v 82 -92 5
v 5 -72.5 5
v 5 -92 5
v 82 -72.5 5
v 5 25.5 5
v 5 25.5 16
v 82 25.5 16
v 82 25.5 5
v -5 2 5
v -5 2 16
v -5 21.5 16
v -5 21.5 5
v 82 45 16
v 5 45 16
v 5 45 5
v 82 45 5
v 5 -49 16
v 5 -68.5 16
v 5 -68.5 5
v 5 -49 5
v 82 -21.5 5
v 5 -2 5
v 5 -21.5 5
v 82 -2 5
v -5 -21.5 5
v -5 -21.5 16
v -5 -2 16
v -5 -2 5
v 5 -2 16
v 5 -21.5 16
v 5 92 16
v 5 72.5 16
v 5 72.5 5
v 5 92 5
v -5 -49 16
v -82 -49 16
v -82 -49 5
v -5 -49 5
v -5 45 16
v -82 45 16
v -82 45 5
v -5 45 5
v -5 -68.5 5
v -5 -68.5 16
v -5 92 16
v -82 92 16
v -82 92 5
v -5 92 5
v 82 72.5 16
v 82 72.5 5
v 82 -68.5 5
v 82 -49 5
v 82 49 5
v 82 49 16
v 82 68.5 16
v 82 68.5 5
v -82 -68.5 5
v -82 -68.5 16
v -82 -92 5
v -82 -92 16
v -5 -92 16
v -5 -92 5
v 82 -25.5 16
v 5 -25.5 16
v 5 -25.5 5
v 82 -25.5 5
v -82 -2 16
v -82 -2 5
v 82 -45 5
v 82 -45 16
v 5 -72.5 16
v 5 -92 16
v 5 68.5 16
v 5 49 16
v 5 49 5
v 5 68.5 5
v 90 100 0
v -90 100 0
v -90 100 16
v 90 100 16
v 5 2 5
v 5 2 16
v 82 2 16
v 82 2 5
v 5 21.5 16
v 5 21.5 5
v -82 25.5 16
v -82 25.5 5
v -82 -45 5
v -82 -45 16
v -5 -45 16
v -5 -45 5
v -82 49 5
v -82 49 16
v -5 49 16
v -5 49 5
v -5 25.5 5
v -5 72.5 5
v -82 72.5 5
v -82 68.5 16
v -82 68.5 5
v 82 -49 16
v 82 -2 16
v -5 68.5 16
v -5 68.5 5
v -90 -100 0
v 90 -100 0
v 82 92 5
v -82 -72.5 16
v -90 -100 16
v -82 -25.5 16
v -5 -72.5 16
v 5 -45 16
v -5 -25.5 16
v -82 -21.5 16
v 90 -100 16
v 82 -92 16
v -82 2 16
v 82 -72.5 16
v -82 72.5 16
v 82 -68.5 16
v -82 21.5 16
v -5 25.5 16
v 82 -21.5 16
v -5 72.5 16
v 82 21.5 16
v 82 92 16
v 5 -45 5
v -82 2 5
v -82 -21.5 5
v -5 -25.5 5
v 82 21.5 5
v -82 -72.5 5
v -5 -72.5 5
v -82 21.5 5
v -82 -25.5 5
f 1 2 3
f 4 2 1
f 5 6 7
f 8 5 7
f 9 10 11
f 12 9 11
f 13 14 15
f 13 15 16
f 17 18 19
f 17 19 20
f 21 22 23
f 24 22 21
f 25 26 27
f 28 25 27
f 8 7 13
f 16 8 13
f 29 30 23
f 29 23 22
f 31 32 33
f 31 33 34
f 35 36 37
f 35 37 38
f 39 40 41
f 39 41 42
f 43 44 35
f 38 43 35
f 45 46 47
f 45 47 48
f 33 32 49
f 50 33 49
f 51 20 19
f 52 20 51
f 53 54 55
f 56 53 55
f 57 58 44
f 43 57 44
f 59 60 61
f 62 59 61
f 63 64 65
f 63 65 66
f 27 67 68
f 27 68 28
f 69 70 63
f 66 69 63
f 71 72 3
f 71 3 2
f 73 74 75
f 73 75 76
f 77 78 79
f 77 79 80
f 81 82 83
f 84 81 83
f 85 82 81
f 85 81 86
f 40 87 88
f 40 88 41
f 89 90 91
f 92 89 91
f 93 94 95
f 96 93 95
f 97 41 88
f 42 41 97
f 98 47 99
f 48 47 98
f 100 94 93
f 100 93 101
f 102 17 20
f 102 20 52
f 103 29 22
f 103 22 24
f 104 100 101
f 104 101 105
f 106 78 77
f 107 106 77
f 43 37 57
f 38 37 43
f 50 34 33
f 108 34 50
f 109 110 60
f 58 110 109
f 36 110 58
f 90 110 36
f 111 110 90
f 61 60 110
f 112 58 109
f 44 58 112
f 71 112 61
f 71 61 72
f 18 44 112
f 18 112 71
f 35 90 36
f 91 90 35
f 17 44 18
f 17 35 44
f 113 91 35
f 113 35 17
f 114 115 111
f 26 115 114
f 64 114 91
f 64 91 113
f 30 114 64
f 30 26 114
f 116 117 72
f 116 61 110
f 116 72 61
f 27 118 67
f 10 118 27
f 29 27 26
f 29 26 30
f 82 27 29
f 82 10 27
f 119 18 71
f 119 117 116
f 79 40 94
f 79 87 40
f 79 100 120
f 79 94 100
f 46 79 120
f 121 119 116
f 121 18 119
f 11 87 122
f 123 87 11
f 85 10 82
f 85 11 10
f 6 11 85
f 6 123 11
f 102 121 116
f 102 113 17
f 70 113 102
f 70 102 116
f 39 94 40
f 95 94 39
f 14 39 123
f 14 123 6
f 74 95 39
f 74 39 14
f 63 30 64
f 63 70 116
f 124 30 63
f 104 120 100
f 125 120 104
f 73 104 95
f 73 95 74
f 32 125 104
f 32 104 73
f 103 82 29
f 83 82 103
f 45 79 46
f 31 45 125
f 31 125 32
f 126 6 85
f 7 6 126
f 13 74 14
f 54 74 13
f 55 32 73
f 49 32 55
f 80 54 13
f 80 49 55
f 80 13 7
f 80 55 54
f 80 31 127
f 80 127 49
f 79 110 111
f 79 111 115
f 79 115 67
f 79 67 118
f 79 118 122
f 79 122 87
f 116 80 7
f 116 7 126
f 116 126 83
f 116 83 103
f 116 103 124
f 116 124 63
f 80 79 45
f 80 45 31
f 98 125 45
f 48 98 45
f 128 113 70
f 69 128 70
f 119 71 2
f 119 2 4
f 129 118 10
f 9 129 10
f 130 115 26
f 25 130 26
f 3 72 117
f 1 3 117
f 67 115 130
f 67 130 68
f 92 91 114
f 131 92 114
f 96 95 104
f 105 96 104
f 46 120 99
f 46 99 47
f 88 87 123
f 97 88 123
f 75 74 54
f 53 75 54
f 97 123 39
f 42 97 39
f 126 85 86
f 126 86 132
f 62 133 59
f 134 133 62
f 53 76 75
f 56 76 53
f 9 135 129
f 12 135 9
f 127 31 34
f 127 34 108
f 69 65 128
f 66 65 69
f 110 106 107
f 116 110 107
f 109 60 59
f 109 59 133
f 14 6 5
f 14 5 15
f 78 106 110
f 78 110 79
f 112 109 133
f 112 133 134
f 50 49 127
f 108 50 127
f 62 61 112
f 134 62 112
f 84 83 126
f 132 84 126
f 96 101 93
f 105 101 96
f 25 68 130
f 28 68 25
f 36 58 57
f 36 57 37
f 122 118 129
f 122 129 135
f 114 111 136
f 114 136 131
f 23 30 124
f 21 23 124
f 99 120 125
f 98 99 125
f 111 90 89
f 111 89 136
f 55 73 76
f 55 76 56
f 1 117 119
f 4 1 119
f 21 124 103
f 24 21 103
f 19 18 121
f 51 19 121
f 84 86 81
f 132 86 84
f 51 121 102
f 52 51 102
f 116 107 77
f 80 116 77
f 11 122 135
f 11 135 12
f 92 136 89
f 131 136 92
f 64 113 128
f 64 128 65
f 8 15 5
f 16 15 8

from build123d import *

# Parameters (mm, degrees)
F0_W     = 180
F0_H     = 200
F1_DEPTH = 16
F2_W     = 77
F2_H     = 19.5
F3_DEPTH = 11


with BuildPart() as f1:
    # F0 (on Top) → F1 (new body)
    with BuildSketch(Plane.XY):
        Rectangle(F0_W, F0_H)
    extrude(amount=F1_DEPTH)

    # F2 (on face) → F3 (cut)
    with BuildSketch(Plane.XY.offset(16)):
        with Locations((-43.5, 82.25)):
            Rectangle(F2_W, F2_H)
        with Locations((-43.5, 58.75)):
            Rectangle(F2_W, F2_H)
        with Locations((43.5, 58.75)):
            Rectangle(F2_W, F2_H)
        with Locations((43.5, 82.25)):
            Rectangle(F2_W, F2_H)
        with Locations((43.5, 35.25)):
            Rectangle(F2_W, F2_H)
        with Locations((-43.5, 35.25)):
            Rectangle(F2_W, F2_H)
        with Locations((-43.5, 11.75)):
            Rectangle(F2_W, F2_H)
        with Locations((43.5, 11.75)):
            Rectangle(F2_W, F2_H)
        with Locations((43.5, -11.75)):
            Rectangle(F2_W, F2_H)
        with Locations((-43.5, -11.75)):
            Rectangle(F2_W, F2_H)
        with Locations((-43.5, -35.25)):
            Rectangle(F2_W, F2_H)
        with Locations((43.5, -35.25)):
            Rectangle(F2_W, F2_H)
        with Locations((-43.5, -58.75)):
            Rectangle(F2_W, F2_H)
        with Locations((43.5, -58.75)):
            Rectangle(F2_W, F2_H)
        with Locations((-43.5, -82.25)):
            Rectangle(F2_W, F2_H)
        with Locations((43.5, -82.25)):
            Rectangle(F2_W, F2_H)
    extrude(amount=-F3_DEPTH, mode=Mode.SUBTRACT)


solid = f1.part
